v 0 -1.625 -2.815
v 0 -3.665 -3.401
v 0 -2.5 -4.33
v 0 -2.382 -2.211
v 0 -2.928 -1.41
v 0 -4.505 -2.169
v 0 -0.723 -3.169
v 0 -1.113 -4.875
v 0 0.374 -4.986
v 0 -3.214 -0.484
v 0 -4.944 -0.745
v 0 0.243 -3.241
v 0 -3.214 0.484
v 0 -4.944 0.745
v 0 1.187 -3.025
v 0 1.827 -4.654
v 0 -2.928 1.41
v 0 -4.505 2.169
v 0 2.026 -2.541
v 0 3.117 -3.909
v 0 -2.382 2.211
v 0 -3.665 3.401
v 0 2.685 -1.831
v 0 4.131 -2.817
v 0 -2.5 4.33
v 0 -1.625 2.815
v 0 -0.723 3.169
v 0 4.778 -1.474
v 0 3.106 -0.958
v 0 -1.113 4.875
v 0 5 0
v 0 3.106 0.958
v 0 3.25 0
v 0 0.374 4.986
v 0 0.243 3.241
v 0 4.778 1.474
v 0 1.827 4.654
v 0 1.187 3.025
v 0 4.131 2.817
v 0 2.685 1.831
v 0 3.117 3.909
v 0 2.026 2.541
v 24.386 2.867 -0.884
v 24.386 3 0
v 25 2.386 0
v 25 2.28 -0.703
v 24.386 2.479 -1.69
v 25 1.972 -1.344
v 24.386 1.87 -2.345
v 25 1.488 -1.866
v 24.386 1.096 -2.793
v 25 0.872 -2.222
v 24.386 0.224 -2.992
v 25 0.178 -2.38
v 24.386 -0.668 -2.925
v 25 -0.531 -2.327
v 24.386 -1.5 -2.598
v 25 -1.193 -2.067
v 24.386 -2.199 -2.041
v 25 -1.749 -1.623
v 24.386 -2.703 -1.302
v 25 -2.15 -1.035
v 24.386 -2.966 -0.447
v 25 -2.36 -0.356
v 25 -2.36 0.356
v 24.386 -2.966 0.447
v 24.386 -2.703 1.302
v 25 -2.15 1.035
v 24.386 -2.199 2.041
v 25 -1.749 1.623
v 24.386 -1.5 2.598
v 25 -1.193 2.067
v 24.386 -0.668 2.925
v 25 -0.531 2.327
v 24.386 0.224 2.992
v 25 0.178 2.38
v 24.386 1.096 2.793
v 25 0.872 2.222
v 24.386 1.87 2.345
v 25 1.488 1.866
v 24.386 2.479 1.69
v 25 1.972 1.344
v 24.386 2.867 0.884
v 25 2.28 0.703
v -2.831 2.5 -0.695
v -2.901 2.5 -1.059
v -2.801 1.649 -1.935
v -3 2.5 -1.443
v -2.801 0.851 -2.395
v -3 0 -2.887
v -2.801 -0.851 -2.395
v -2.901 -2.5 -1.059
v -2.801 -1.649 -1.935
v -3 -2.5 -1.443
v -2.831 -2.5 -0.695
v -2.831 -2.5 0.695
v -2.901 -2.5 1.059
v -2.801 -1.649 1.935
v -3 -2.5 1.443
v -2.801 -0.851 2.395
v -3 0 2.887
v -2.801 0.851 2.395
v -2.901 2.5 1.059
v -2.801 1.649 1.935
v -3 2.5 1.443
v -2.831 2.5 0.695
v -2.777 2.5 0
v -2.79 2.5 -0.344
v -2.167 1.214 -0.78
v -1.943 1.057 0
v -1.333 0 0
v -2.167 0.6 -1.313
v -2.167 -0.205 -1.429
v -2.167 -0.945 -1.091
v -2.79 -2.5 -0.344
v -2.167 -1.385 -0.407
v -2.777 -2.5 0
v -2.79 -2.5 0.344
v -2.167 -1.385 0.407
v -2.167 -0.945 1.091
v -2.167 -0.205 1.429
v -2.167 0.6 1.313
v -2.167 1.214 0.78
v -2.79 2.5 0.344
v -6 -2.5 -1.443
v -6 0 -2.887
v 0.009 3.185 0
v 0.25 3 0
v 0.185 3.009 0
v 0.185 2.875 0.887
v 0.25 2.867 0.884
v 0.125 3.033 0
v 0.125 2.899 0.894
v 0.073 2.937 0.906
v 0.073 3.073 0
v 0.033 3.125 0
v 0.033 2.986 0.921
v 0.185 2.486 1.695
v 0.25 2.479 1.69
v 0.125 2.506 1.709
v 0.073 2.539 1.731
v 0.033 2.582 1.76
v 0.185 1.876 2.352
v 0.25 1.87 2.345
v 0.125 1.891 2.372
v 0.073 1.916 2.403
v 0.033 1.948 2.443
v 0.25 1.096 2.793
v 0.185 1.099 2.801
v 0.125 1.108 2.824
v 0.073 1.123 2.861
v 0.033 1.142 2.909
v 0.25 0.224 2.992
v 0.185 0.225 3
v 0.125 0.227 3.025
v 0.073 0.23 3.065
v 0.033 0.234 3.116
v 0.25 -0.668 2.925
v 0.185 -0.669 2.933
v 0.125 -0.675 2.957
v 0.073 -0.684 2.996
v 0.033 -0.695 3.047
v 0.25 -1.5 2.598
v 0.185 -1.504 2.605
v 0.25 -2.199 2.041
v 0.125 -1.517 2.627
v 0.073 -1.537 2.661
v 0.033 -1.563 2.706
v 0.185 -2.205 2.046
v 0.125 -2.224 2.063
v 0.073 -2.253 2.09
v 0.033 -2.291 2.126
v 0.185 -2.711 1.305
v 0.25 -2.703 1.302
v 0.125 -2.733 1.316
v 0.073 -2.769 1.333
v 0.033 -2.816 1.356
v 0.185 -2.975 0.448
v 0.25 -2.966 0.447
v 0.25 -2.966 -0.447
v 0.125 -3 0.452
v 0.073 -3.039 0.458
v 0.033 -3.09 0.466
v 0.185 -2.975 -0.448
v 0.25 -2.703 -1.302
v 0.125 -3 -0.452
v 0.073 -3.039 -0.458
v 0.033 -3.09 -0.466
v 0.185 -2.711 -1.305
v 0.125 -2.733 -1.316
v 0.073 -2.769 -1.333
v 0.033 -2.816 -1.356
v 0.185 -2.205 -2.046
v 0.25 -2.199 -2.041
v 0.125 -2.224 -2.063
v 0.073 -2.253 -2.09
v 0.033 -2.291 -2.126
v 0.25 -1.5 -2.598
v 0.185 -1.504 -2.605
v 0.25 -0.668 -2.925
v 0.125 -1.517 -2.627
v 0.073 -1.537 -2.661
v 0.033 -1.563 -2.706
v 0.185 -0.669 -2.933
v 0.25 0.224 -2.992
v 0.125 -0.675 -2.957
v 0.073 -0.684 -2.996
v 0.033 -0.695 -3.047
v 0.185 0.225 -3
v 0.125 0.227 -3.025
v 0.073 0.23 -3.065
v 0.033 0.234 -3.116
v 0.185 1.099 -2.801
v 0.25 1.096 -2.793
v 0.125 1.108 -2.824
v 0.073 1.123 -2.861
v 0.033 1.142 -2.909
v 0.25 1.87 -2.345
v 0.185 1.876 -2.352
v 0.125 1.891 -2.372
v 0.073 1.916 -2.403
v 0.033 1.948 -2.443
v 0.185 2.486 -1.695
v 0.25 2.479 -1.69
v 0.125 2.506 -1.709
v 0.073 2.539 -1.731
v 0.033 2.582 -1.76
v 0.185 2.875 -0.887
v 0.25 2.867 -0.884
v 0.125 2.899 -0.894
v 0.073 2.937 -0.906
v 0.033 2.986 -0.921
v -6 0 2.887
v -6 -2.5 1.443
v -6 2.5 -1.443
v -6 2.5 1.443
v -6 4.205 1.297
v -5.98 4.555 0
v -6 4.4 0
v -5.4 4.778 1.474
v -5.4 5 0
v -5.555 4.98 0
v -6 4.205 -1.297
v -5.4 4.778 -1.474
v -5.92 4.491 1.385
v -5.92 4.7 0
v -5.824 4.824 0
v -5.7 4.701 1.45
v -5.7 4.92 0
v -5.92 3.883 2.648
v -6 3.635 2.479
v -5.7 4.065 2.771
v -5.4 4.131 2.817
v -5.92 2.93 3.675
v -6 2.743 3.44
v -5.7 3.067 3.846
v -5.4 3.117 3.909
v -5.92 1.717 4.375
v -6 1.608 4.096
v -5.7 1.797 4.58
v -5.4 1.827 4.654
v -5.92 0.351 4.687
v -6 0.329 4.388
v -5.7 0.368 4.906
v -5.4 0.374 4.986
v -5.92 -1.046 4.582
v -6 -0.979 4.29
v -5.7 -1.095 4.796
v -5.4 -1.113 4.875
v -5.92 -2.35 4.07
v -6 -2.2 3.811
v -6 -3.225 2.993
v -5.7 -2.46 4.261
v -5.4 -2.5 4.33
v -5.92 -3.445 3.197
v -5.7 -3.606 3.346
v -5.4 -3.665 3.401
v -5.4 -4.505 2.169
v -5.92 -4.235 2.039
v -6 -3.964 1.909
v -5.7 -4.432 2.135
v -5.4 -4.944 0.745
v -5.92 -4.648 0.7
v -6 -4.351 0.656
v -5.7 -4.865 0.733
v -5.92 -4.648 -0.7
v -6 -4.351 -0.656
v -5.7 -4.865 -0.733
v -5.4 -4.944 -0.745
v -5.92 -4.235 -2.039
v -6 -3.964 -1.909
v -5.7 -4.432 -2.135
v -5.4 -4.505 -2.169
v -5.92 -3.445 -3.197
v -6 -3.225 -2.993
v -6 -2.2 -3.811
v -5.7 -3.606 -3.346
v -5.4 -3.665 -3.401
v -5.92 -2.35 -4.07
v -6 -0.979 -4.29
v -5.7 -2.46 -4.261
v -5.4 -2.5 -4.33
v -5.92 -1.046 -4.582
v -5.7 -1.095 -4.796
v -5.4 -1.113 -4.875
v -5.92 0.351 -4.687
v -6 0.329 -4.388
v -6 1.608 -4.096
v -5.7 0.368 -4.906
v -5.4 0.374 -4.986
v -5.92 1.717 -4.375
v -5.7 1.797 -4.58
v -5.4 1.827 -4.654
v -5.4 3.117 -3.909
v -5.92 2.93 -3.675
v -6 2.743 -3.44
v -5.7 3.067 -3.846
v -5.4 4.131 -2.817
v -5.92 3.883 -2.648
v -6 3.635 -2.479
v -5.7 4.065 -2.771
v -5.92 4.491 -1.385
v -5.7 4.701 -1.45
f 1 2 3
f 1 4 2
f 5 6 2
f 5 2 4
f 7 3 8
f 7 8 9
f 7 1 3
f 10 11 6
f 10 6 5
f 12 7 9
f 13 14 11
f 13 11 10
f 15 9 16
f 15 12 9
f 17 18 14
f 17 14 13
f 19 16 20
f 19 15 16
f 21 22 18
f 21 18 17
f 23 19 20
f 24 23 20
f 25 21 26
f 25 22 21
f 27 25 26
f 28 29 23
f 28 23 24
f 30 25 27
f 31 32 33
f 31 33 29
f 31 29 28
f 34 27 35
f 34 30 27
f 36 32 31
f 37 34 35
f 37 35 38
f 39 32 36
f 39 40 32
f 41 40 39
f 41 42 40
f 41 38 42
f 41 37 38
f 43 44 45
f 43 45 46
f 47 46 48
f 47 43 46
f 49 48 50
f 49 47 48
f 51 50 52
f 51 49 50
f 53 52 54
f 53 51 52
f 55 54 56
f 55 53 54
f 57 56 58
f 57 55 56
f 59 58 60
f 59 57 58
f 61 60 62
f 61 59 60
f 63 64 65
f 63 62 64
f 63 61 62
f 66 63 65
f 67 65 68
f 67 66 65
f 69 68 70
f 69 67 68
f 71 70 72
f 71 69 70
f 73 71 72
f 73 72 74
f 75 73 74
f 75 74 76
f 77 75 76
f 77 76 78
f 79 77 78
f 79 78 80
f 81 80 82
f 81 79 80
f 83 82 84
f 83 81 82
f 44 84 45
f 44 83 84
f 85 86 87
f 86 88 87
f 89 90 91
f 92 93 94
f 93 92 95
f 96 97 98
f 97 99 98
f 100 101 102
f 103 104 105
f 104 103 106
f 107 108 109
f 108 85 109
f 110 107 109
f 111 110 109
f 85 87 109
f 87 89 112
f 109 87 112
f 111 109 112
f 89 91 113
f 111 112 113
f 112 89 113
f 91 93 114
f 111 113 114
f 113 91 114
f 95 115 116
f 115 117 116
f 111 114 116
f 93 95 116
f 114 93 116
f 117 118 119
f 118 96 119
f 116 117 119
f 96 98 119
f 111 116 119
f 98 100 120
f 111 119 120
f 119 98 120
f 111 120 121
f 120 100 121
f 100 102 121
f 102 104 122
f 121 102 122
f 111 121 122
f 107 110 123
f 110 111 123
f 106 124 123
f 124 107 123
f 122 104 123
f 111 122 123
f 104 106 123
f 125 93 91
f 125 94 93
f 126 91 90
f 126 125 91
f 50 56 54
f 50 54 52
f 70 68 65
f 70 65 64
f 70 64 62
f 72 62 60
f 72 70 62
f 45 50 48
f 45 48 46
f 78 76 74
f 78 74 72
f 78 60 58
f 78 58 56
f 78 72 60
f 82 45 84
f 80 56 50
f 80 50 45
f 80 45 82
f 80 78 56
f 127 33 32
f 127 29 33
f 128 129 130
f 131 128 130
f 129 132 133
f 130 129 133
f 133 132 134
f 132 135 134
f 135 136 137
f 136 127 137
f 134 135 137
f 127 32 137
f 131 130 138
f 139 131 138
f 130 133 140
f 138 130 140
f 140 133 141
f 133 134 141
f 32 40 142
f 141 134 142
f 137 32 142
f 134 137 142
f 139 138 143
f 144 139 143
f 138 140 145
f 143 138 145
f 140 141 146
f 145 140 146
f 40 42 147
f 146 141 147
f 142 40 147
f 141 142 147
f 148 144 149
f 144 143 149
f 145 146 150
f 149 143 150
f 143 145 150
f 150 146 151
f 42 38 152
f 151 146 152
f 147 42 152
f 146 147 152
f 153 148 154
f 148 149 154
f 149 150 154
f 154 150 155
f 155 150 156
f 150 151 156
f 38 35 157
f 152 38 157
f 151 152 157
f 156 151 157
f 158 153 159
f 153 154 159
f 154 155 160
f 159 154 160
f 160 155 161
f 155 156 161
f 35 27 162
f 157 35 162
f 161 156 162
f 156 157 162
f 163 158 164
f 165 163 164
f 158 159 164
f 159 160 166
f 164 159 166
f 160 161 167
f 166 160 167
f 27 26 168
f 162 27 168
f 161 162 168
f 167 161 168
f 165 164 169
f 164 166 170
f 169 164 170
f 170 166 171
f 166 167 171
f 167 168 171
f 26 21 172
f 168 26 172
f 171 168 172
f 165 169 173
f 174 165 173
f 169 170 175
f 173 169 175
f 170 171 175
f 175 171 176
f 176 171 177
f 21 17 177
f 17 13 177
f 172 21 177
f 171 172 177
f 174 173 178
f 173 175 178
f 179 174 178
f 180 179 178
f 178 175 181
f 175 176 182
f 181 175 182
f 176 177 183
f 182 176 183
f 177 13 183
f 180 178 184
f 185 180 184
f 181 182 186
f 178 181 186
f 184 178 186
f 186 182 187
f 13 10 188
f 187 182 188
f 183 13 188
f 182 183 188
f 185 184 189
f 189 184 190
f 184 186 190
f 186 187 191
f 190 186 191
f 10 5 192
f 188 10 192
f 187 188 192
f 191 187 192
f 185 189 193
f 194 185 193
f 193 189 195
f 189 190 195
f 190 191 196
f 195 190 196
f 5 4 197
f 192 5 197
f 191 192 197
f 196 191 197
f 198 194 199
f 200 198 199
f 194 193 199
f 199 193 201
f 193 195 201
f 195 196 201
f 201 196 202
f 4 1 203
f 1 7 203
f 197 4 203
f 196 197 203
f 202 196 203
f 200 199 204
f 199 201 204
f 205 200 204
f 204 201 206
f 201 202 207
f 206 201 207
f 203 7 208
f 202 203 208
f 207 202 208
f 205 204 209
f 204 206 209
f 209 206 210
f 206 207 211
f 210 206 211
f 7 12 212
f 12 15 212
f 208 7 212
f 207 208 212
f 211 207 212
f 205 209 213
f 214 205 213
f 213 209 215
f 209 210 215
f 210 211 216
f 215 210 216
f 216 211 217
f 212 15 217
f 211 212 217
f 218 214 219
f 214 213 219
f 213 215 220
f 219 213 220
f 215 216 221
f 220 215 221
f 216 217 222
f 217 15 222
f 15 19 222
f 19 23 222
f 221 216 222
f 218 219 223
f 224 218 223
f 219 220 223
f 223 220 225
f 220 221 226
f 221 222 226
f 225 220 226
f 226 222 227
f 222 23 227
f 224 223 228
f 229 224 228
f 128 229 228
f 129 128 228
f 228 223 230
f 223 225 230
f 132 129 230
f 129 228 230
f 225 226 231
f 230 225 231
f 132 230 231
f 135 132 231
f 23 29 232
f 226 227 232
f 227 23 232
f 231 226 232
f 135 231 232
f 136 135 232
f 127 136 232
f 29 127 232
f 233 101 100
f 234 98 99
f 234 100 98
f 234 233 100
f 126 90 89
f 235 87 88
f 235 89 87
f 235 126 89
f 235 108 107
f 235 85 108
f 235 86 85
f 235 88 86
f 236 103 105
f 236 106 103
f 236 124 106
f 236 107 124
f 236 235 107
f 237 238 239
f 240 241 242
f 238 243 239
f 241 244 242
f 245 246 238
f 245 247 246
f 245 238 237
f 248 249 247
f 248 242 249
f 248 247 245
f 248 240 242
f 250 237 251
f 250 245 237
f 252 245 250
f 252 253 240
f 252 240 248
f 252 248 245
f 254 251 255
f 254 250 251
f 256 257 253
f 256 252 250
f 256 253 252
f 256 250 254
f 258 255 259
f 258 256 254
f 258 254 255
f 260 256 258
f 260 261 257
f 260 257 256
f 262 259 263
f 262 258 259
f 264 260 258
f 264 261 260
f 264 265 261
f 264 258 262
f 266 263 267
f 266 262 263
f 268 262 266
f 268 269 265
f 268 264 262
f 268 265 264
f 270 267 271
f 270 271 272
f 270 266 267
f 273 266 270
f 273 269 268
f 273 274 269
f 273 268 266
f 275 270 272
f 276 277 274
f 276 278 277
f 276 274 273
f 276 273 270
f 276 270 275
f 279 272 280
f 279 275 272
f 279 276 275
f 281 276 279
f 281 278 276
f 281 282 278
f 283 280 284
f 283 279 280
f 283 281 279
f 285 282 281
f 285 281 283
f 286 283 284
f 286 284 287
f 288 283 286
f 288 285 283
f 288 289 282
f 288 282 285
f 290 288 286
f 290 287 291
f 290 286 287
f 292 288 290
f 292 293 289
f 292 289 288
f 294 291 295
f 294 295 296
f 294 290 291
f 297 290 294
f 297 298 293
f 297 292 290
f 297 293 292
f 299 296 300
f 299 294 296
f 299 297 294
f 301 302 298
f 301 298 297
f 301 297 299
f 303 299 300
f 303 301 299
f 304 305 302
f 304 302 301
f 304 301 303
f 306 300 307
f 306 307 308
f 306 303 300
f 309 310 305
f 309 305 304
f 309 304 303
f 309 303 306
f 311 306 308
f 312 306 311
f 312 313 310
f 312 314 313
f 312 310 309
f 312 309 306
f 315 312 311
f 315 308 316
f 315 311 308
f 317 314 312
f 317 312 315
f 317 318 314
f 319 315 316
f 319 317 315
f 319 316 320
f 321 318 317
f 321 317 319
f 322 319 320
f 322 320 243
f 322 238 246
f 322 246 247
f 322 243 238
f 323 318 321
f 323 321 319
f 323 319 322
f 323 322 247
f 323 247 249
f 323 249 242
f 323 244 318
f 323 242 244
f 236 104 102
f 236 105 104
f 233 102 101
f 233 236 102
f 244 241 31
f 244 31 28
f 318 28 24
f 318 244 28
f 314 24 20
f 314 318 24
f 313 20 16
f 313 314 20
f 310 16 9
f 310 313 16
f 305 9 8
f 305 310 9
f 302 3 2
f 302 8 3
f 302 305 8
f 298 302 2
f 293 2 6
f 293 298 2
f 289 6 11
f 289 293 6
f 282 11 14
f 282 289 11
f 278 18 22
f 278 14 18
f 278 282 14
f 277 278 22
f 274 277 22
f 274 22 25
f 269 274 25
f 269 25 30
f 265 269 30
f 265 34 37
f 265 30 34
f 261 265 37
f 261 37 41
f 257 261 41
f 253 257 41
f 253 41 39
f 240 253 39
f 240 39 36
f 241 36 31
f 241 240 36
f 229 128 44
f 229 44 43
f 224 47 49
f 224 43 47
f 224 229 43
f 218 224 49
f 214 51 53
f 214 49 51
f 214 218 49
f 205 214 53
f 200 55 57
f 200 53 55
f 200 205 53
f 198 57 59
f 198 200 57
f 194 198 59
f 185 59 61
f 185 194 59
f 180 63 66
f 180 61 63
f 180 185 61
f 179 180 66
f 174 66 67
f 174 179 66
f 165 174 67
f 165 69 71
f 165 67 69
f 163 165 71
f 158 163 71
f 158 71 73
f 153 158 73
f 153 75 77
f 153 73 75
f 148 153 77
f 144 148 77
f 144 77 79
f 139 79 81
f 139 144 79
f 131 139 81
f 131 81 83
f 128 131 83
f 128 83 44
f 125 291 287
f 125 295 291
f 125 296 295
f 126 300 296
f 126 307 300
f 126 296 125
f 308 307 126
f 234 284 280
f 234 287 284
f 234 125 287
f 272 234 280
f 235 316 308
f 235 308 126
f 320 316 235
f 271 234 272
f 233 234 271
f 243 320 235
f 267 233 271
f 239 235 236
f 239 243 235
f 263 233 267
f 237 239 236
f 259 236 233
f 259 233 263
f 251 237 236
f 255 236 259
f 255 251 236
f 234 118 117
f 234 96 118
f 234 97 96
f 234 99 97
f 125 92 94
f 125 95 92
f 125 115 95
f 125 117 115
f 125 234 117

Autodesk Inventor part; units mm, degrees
ref_plane "YZ Plane" through (0, 0, 0) normal (1, 0, 0) x (0, 1, 0)
ref_plane "XZ Plane" through (0, 0, 0) normal (0, 1, 0) x (-1, 0, 0)
sketch "Sketch1" plane through (0, 0, 0) normal (0, 0, 1) x (1, 0, 0)
  line L0 (-1.3333, 0) -> (25, 0)
  line L1 (25, 0) -> (25, 3)
  line L2 (25, 3) -> (1.8269, 3)
  line L3 (1.8269, 3) -> (1.2134, 3)
  line L4 (1.2134, 3) -> (0, 3)
  line L5 (0, 3) -> (0, 5)
  line L6 (0, 5) -> (-6, 5)
  line L7 (-6, 5) -> (-6, 2.8868)
  line L8 (-6, 2.8868) -> (-3, 2.8868)
  line L9 (-3, 2.8868) -> (-1.3333, 0)
  line L10 (-12.2, 0) -> (31.2, 0) projected
  line L11 (0, -1) -> (0, 6) projected
  line L12 (1.8269, 3) -> (0, 3) construction
  dimension "d0" = 23.1731
  dimension "d1" = 0.6135
  dimension "d2" = 6
  dimension "d3" = 3
  dimension "d4" = 60
  dimension "d5" = 6
  dimension "d6" = 6
  dimension "d7" = 5.7735
  dimension "d8" = 10
  dimension "d19" = 25
revolve "Body" add sketch "Sketch1" angle 360 about axis through (-1.3333, 0, 0) along (1, 0, 0)
sketch "Sketch2" plane through (-6, 0, 0) normal (-1, 0, 0) x (0, 0, 1)
  circle A0 centre (0, 0) radius 2.8868 projected
  line L0 (0, -7) -> (0, 7) projected
  line L1 (-7, 0) -> (7, 0) projected
  line L2 (2.8868, 0) -> (1.4434, -2.5)
  line L3 (1.4434, -2.5) -> (-1.4434, -2.5)
  line L4 (-1.4434, -2.5) -> (-2.8868, 0)
  line L5 (-2.8868, 0) -> (-1.4434, 2.5)
  line L6 (-1.4434, 2.5) -> (1.4434, 2.5)
  line L7 (1.4434, 2.5) -> (2.8868, 0)
extrude "Slot" add sketch "Sketch2" against normal up to next contours L7 A0 | A0 L2 | L6 L0 A0 | A0 L0 L3 | L0 L6 A0 | A0 L3 L0 | L4 A0 | A0 L5
fillet "Fillet2" radius 0.6 1 edges at (-6, -5, 0)
thread "Thread" size "M6x1" class "6g" standard "ISO Metric profile" length 23.1731
chamfer "Chamfer1" distance 0.6135 distance2 0.6135 1 edges at (25, -3, 0) measured on face at (25, -0.5681, -0.823)
fillet "Fillet1" radius 0.25 1 edges at (0, -3, 0)
ref_plane "Work Plane1" through (30, 0, 0) normal (0, -0.5, 0.866) x (1, 0, 0)
equation "\"d0\" = GEL"
equation "\"d1\" = GAL"
equation "\"d2\" = KOH"
equation "\"d3\" = INTI"
equation "\"d5\" = GD"
equation "\"d6\" = BDM"
equation "\"d7\" = 1.1547 * SW"
equation "\"d8\" = KOD"
equation "\"d19\" = NLG"
equation "\"d16\" = RR"
equation "\"d12\" = GEL"
equation "\"d14\" = -0.5 * SPD + 0.5 * GD"
equation "\"d15\" = GUL"
equation "\"d29\" = R"
equation "\"GD\" = NND"
equation "\"NLG\" = 25"
equation "\"GEL\" = 23.1731"
equation "\"KOD\" = 10"
equation "\"KOH\" = 6"
equation "\"INTI\" = 3"
equation "\"GAL\" = 0.61345 * PTC"
equation "\"GUL\" = 0.61345 * PTC"
equation "\"BDM\" = NND"
equation "\"SW\" = 5"
equation "\"RR\" = 0.6"
equation "\"SPD\" = 4.7731"
equation "\"d28\" = R"
equation "\"R\" = 0.25"
equation "\"TOA\" = 30deg"
equation "\"THREADDIA\" = 6"
equation "\"PTC\" = 1"
equation "\"NND\" = 6"
equation "\"E0\" = 1.155 * SW"
equation "\"GD1\" = THREADDIA - 1.2269 * PTC"
properties part number "ANSI B18.3.1M - M6x1 x 25, BSHCSM" material "Steel, Mild"
